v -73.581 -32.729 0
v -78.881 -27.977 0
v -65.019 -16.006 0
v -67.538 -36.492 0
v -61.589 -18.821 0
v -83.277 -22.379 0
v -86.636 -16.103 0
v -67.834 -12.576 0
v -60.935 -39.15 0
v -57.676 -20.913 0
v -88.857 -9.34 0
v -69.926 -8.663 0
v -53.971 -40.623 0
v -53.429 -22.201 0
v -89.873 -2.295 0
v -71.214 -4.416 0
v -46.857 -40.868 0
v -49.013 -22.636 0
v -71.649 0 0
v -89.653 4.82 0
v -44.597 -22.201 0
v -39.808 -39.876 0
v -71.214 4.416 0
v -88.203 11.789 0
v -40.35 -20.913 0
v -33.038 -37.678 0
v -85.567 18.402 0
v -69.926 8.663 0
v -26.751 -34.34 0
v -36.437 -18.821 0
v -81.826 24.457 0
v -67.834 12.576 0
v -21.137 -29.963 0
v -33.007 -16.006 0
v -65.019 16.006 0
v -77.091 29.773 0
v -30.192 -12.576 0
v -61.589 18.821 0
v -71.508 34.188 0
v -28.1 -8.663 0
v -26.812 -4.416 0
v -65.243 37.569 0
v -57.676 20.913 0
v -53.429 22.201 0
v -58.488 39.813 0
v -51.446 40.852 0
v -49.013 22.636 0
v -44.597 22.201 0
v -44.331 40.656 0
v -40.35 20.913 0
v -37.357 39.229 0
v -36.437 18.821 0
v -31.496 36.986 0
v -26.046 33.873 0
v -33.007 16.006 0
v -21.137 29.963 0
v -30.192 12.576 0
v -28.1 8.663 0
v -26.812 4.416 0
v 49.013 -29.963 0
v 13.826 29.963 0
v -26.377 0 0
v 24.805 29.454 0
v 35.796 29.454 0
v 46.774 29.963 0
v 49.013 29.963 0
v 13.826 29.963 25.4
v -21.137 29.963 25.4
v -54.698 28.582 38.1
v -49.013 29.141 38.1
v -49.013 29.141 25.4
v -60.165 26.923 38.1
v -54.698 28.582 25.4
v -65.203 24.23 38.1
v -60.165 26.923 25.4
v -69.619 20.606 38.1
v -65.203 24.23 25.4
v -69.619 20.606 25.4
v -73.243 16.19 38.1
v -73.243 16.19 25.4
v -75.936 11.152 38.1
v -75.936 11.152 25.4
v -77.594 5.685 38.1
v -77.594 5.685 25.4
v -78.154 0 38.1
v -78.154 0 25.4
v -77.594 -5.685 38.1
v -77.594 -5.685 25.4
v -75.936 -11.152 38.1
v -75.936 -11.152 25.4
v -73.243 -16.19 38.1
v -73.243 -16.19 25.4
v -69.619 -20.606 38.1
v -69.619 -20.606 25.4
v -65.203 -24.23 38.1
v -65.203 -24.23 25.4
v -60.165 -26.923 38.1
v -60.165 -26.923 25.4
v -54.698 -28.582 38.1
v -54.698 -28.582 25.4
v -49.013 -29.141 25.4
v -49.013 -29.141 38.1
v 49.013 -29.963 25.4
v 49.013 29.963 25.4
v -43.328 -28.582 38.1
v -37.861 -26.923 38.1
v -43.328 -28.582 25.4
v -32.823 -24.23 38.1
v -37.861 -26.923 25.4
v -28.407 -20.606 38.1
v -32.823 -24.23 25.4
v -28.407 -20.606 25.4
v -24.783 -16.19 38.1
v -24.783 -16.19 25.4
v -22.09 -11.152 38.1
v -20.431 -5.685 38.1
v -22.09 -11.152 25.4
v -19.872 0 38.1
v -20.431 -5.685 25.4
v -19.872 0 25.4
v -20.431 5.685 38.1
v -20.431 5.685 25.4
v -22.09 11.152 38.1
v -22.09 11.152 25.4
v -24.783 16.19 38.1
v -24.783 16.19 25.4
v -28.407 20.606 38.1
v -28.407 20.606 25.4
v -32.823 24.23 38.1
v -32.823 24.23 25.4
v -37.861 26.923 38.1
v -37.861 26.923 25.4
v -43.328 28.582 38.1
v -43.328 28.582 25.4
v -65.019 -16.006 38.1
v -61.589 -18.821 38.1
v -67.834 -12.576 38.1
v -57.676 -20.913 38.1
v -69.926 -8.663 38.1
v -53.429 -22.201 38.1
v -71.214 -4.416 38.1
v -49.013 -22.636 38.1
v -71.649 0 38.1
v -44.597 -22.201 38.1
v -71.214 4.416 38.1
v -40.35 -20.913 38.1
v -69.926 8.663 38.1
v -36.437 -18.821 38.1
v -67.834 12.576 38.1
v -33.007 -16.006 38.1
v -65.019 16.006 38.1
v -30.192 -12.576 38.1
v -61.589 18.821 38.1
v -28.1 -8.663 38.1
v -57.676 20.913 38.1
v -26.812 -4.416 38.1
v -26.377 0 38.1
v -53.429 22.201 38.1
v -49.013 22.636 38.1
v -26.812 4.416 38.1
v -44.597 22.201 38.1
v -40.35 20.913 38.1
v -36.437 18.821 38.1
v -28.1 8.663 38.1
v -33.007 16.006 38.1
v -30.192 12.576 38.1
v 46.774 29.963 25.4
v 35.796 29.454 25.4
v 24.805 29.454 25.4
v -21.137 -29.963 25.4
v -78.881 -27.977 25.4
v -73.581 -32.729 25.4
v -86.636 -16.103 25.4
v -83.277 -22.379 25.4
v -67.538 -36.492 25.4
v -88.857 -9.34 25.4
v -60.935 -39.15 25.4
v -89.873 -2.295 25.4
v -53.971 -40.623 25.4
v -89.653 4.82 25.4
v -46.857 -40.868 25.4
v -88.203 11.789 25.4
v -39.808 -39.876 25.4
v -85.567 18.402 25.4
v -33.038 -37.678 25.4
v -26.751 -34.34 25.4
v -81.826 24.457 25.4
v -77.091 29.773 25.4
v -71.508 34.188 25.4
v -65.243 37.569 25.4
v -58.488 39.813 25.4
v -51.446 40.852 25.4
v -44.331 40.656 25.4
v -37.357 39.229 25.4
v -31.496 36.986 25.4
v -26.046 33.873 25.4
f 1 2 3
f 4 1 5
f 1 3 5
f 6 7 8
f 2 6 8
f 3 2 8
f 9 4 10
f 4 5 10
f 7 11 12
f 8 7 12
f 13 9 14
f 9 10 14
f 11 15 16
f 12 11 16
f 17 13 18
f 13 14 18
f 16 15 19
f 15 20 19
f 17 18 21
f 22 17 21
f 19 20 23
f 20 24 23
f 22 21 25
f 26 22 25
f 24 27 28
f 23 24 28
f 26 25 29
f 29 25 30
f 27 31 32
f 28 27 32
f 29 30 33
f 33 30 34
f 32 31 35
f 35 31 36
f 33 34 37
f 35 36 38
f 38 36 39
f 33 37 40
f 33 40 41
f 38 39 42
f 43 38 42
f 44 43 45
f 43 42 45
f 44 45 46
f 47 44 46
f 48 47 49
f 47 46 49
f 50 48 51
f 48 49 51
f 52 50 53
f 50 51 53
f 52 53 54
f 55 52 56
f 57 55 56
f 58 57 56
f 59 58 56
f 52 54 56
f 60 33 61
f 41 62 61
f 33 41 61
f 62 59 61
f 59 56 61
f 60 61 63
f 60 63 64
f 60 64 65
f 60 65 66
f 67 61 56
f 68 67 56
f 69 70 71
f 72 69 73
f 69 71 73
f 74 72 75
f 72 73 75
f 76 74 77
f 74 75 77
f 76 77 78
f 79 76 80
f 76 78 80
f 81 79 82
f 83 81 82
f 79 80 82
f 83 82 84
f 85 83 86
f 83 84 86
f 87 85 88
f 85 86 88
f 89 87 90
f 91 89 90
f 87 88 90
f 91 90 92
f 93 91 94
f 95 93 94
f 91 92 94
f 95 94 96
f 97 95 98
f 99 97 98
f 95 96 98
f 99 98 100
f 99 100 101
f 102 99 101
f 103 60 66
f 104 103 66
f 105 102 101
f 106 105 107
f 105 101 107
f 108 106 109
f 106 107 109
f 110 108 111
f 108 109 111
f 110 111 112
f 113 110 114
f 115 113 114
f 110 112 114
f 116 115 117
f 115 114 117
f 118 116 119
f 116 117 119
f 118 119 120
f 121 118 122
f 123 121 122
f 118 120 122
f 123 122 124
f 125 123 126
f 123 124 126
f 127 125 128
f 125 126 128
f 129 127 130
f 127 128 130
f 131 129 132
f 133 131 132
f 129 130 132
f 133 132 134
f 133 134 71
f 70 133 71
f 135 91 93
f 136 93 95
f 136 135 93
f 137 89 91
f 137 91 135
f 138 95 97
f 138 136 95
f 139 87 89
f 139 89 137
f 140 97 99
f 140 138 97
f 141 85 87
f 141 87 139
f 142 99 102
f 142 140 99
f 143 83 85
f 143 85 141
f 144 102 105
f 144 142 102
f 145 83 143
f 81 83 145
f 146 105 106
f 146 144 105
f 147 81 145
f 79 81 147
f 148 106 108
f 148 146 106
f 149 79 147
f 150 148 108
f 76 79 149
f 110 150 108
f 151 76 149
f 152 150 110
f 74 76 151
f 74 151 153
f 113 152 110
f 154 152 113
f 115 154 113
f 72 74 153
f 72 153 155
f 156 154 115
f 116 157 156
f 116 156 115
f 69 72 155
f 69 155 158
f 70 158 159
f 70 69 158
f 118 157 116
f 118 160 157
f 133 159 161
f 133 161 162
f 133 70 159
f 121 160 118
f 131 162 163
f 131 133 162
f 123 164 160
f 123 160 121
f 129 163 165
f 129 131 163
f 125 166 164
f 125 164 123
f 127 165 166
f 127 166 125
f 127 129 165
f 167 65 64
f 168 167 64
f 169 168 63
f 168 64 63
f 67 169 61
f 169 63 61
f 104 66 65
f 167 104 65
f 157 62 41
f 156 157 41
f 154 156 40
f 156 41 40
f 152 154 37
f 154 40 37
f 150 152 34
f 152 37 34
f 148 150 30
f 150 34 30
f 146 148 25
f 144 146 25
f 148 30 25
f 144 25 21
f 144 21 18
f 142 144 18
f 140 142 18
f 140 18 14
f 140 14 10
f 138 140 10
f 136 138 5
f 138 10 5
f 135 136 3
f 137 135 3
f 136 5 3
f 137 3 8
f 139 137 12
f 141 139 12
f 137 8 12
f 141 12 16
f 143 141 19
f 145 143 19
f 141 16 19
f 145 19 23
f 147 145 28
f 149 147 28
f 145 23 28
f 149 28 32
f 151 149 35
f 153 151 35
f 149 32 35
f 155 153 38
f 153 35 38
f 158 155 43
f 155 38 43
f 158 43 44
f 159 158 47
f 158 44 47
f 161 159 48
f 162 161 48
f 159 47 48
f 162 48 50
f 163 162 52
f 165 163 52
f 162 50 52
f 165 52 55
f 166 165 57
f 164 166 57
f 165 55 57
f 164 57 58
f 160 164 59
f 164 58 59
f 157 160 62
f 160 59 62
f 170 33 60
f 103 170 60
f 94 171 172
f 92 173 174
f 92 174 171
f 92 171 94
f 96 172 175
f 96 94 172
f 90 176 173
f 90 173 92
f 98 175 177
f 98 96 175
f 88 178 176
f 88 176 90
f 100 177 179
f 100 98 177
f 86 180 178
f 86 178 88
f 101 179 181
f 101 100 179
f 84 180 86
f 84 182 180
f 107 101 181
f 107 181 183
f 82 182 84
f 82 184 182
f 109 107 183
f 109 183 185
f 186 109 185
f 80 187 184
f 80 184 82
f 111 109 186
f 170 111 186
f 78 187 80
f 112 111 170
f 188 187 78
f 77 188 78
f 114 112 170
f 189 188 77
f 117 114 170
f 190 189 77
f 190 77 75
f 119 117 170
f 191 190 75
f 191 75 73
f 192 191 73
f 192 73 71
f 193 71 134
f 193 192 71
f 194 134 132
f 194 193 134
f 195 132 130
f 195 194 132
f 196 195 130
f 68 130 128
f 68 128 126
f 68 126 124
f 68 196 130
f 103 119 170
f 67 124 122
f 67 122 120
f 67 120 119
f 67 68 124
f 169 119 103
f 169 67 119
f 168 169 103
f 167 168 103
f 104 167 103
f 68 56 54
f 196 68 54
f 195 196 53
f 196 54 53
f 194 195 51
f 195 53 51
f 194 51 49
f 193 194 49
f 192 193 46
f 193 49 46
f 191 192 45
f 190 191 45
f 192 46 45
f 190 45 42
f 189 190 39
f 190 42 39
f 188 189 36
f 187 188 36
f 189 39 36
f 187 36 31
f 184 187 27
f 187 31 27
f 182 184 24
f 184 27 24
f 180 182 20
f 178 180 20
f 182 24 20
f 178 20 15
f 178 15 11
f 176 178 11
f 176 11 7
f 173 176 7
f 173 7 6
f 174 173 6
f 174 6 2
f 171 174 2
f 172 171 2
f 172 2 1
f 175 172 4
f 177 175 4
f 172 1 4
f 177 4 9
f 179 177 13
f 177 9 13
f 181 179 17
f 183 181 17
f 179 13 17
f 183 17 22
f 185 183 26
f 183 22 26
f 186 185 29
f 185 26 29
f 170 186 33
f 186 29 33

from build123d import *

# Parameters (mm, degrees)
F1_DEPTH = 25.4
F2_DEPTH = 38.1


with BuildPart() as f1:
    # F0 (on Top) → F1 (new body)
    with BuildSketch(Plane.XY):
        with BuildLine():
            Line((49.0129638637, 29.9626197666), (46.774469316, 29.9626197666))
            ThreePointArc((46.774469316, 29.9626197666), (30.3001427561, 29.390654175), (13.8258161962, 29.9626197666))
            Line((13.8258161962, 29.9626197666), (-21.1371275652, 29.9626197666))
            ThreePointArc((-21.1371275652, 29.9626197666), (-11.4921190987, 16.3403500801), (-8.0883889408, 0))
            ThreePointArc((-8.0883889408, 0), (-11.4921190987, -16.3403500801), (-21.1371275652, -29.9626197666))
            Line((-21.1371275652, -29.9626197666), (49.0129638637, -29.9626197666))
            Line((49.0129638637, -29.9626197666), (49.0129638637, 29.9626197666))
        make_face()
        with BuildLine():
            Line((-49.0129638637, 29.9626197666), (-21.1371275652, 29.9626197666))
            ThreePointArc((-21.1371275652, 29.9626197666), (-28.7111277901, 35.5338751709), (-37.3567476866, 39.2294972827))
            ThreePointArc((-37.3567476866, 39.2294972827), (-88.8574497894, -9.3401163775), (-21.1371275652, -29.9626197666))
            Line((-21.1371275652, -29.9626197666), (-49.0129638637, -29.9626197666))
            Line((-49.0129638637, -29.9626197666), (-49.0129638637, -29.141463528))
            ThreePointArc((-49.0129638637, -29.141463528), (-78.1544273918, 0), (-49.0129638637, 29.141463528))
            Line((-49.0129638637, 29.141463528), (-49.0129638637, 29.9626197666))
        make_face()
        with BuildLine():
            ThreePointArc((-8.0883889408, 0), (-11.4921190987, 16.3403500801), (-21.1371275652, 29.9626197666))
            Line((-21.1371275652, 29.9626197666), (-49.0129638637, 29.9626197666))
            Line((-49.0129638637, 29.9626197666), (-49.0129638637, 29.141463528))
            ThreePointArc((-49.0129638637, 29.141463528), (-28.4068373894, 20.6061264744), (-19.8715003357, 0))
            ThreePointArc((-19.8715003357, 0), (-28.4068373894, -20.6061264744), (-49.0129638637, -29.141463528))
            Line((-49.0129638637, -29.141463528), (-49.0129638637, -29.9626197666))
            Line((-49.0129638637, -29.9626197666), (-21.1371275652, -29.9626197666))
            ThreePointArc((-21.1371275652, -29.9626197666), (-11.4921190987, -16.3403500801), (-8.0883889408, 0))
        make_face()
    extrude(amount=F1_DEPTH)

    # F0 (on Top) → F2 (join)
    with BuildSketch(Plane.XY):
        with BuildLine():
            ThreePointArc((-19.8715003357, 0), (-28.4068373894, 20.6061264744), (-49.0129638637, 29.141463528))
            Line((-49.0129638637, 29.141463528), (-49.0129638637, 22.6363457986))
            ThreePointArc((-49.0129638637, 22.6363457986), (-33.0066502483, 16.0063136155), (-26.3766180651, 0))
            ThreePointArc((-26.3766180651, 0), (-33.0066502483, -16.0063136155), (-49.0129638637, -22.6363457986))
            Line((-49.0129638637, -22.6363457986), (-49.0129638637, -29.141463528))
            ThreePointArc((-49.0129638637, -29.141463528), (-28.4068373894, -20.6061264744), (-19.8715003357, 0))
        make_face()
        with BuildLine():
            Line((-49.0129638637, 22.6363457986), (-49.0129638637, 29.141463528))
            ThreePointArc((-49.0129638637, 29.141463528), (-78.1544273918, 0), (-49.0129638637, -29.141463528))
            Line((-49.0129638637, -29.141463528), (-49.0129638637, -22.6363457986))
            ThreePointArc((-49.0129638637, -22.6363457986), (-71.6493096624, 0), (-49.0129638637, 22.6363457986))
        make_face()
    extrude(amount=F2_DEPTH)


solid = f1.part
